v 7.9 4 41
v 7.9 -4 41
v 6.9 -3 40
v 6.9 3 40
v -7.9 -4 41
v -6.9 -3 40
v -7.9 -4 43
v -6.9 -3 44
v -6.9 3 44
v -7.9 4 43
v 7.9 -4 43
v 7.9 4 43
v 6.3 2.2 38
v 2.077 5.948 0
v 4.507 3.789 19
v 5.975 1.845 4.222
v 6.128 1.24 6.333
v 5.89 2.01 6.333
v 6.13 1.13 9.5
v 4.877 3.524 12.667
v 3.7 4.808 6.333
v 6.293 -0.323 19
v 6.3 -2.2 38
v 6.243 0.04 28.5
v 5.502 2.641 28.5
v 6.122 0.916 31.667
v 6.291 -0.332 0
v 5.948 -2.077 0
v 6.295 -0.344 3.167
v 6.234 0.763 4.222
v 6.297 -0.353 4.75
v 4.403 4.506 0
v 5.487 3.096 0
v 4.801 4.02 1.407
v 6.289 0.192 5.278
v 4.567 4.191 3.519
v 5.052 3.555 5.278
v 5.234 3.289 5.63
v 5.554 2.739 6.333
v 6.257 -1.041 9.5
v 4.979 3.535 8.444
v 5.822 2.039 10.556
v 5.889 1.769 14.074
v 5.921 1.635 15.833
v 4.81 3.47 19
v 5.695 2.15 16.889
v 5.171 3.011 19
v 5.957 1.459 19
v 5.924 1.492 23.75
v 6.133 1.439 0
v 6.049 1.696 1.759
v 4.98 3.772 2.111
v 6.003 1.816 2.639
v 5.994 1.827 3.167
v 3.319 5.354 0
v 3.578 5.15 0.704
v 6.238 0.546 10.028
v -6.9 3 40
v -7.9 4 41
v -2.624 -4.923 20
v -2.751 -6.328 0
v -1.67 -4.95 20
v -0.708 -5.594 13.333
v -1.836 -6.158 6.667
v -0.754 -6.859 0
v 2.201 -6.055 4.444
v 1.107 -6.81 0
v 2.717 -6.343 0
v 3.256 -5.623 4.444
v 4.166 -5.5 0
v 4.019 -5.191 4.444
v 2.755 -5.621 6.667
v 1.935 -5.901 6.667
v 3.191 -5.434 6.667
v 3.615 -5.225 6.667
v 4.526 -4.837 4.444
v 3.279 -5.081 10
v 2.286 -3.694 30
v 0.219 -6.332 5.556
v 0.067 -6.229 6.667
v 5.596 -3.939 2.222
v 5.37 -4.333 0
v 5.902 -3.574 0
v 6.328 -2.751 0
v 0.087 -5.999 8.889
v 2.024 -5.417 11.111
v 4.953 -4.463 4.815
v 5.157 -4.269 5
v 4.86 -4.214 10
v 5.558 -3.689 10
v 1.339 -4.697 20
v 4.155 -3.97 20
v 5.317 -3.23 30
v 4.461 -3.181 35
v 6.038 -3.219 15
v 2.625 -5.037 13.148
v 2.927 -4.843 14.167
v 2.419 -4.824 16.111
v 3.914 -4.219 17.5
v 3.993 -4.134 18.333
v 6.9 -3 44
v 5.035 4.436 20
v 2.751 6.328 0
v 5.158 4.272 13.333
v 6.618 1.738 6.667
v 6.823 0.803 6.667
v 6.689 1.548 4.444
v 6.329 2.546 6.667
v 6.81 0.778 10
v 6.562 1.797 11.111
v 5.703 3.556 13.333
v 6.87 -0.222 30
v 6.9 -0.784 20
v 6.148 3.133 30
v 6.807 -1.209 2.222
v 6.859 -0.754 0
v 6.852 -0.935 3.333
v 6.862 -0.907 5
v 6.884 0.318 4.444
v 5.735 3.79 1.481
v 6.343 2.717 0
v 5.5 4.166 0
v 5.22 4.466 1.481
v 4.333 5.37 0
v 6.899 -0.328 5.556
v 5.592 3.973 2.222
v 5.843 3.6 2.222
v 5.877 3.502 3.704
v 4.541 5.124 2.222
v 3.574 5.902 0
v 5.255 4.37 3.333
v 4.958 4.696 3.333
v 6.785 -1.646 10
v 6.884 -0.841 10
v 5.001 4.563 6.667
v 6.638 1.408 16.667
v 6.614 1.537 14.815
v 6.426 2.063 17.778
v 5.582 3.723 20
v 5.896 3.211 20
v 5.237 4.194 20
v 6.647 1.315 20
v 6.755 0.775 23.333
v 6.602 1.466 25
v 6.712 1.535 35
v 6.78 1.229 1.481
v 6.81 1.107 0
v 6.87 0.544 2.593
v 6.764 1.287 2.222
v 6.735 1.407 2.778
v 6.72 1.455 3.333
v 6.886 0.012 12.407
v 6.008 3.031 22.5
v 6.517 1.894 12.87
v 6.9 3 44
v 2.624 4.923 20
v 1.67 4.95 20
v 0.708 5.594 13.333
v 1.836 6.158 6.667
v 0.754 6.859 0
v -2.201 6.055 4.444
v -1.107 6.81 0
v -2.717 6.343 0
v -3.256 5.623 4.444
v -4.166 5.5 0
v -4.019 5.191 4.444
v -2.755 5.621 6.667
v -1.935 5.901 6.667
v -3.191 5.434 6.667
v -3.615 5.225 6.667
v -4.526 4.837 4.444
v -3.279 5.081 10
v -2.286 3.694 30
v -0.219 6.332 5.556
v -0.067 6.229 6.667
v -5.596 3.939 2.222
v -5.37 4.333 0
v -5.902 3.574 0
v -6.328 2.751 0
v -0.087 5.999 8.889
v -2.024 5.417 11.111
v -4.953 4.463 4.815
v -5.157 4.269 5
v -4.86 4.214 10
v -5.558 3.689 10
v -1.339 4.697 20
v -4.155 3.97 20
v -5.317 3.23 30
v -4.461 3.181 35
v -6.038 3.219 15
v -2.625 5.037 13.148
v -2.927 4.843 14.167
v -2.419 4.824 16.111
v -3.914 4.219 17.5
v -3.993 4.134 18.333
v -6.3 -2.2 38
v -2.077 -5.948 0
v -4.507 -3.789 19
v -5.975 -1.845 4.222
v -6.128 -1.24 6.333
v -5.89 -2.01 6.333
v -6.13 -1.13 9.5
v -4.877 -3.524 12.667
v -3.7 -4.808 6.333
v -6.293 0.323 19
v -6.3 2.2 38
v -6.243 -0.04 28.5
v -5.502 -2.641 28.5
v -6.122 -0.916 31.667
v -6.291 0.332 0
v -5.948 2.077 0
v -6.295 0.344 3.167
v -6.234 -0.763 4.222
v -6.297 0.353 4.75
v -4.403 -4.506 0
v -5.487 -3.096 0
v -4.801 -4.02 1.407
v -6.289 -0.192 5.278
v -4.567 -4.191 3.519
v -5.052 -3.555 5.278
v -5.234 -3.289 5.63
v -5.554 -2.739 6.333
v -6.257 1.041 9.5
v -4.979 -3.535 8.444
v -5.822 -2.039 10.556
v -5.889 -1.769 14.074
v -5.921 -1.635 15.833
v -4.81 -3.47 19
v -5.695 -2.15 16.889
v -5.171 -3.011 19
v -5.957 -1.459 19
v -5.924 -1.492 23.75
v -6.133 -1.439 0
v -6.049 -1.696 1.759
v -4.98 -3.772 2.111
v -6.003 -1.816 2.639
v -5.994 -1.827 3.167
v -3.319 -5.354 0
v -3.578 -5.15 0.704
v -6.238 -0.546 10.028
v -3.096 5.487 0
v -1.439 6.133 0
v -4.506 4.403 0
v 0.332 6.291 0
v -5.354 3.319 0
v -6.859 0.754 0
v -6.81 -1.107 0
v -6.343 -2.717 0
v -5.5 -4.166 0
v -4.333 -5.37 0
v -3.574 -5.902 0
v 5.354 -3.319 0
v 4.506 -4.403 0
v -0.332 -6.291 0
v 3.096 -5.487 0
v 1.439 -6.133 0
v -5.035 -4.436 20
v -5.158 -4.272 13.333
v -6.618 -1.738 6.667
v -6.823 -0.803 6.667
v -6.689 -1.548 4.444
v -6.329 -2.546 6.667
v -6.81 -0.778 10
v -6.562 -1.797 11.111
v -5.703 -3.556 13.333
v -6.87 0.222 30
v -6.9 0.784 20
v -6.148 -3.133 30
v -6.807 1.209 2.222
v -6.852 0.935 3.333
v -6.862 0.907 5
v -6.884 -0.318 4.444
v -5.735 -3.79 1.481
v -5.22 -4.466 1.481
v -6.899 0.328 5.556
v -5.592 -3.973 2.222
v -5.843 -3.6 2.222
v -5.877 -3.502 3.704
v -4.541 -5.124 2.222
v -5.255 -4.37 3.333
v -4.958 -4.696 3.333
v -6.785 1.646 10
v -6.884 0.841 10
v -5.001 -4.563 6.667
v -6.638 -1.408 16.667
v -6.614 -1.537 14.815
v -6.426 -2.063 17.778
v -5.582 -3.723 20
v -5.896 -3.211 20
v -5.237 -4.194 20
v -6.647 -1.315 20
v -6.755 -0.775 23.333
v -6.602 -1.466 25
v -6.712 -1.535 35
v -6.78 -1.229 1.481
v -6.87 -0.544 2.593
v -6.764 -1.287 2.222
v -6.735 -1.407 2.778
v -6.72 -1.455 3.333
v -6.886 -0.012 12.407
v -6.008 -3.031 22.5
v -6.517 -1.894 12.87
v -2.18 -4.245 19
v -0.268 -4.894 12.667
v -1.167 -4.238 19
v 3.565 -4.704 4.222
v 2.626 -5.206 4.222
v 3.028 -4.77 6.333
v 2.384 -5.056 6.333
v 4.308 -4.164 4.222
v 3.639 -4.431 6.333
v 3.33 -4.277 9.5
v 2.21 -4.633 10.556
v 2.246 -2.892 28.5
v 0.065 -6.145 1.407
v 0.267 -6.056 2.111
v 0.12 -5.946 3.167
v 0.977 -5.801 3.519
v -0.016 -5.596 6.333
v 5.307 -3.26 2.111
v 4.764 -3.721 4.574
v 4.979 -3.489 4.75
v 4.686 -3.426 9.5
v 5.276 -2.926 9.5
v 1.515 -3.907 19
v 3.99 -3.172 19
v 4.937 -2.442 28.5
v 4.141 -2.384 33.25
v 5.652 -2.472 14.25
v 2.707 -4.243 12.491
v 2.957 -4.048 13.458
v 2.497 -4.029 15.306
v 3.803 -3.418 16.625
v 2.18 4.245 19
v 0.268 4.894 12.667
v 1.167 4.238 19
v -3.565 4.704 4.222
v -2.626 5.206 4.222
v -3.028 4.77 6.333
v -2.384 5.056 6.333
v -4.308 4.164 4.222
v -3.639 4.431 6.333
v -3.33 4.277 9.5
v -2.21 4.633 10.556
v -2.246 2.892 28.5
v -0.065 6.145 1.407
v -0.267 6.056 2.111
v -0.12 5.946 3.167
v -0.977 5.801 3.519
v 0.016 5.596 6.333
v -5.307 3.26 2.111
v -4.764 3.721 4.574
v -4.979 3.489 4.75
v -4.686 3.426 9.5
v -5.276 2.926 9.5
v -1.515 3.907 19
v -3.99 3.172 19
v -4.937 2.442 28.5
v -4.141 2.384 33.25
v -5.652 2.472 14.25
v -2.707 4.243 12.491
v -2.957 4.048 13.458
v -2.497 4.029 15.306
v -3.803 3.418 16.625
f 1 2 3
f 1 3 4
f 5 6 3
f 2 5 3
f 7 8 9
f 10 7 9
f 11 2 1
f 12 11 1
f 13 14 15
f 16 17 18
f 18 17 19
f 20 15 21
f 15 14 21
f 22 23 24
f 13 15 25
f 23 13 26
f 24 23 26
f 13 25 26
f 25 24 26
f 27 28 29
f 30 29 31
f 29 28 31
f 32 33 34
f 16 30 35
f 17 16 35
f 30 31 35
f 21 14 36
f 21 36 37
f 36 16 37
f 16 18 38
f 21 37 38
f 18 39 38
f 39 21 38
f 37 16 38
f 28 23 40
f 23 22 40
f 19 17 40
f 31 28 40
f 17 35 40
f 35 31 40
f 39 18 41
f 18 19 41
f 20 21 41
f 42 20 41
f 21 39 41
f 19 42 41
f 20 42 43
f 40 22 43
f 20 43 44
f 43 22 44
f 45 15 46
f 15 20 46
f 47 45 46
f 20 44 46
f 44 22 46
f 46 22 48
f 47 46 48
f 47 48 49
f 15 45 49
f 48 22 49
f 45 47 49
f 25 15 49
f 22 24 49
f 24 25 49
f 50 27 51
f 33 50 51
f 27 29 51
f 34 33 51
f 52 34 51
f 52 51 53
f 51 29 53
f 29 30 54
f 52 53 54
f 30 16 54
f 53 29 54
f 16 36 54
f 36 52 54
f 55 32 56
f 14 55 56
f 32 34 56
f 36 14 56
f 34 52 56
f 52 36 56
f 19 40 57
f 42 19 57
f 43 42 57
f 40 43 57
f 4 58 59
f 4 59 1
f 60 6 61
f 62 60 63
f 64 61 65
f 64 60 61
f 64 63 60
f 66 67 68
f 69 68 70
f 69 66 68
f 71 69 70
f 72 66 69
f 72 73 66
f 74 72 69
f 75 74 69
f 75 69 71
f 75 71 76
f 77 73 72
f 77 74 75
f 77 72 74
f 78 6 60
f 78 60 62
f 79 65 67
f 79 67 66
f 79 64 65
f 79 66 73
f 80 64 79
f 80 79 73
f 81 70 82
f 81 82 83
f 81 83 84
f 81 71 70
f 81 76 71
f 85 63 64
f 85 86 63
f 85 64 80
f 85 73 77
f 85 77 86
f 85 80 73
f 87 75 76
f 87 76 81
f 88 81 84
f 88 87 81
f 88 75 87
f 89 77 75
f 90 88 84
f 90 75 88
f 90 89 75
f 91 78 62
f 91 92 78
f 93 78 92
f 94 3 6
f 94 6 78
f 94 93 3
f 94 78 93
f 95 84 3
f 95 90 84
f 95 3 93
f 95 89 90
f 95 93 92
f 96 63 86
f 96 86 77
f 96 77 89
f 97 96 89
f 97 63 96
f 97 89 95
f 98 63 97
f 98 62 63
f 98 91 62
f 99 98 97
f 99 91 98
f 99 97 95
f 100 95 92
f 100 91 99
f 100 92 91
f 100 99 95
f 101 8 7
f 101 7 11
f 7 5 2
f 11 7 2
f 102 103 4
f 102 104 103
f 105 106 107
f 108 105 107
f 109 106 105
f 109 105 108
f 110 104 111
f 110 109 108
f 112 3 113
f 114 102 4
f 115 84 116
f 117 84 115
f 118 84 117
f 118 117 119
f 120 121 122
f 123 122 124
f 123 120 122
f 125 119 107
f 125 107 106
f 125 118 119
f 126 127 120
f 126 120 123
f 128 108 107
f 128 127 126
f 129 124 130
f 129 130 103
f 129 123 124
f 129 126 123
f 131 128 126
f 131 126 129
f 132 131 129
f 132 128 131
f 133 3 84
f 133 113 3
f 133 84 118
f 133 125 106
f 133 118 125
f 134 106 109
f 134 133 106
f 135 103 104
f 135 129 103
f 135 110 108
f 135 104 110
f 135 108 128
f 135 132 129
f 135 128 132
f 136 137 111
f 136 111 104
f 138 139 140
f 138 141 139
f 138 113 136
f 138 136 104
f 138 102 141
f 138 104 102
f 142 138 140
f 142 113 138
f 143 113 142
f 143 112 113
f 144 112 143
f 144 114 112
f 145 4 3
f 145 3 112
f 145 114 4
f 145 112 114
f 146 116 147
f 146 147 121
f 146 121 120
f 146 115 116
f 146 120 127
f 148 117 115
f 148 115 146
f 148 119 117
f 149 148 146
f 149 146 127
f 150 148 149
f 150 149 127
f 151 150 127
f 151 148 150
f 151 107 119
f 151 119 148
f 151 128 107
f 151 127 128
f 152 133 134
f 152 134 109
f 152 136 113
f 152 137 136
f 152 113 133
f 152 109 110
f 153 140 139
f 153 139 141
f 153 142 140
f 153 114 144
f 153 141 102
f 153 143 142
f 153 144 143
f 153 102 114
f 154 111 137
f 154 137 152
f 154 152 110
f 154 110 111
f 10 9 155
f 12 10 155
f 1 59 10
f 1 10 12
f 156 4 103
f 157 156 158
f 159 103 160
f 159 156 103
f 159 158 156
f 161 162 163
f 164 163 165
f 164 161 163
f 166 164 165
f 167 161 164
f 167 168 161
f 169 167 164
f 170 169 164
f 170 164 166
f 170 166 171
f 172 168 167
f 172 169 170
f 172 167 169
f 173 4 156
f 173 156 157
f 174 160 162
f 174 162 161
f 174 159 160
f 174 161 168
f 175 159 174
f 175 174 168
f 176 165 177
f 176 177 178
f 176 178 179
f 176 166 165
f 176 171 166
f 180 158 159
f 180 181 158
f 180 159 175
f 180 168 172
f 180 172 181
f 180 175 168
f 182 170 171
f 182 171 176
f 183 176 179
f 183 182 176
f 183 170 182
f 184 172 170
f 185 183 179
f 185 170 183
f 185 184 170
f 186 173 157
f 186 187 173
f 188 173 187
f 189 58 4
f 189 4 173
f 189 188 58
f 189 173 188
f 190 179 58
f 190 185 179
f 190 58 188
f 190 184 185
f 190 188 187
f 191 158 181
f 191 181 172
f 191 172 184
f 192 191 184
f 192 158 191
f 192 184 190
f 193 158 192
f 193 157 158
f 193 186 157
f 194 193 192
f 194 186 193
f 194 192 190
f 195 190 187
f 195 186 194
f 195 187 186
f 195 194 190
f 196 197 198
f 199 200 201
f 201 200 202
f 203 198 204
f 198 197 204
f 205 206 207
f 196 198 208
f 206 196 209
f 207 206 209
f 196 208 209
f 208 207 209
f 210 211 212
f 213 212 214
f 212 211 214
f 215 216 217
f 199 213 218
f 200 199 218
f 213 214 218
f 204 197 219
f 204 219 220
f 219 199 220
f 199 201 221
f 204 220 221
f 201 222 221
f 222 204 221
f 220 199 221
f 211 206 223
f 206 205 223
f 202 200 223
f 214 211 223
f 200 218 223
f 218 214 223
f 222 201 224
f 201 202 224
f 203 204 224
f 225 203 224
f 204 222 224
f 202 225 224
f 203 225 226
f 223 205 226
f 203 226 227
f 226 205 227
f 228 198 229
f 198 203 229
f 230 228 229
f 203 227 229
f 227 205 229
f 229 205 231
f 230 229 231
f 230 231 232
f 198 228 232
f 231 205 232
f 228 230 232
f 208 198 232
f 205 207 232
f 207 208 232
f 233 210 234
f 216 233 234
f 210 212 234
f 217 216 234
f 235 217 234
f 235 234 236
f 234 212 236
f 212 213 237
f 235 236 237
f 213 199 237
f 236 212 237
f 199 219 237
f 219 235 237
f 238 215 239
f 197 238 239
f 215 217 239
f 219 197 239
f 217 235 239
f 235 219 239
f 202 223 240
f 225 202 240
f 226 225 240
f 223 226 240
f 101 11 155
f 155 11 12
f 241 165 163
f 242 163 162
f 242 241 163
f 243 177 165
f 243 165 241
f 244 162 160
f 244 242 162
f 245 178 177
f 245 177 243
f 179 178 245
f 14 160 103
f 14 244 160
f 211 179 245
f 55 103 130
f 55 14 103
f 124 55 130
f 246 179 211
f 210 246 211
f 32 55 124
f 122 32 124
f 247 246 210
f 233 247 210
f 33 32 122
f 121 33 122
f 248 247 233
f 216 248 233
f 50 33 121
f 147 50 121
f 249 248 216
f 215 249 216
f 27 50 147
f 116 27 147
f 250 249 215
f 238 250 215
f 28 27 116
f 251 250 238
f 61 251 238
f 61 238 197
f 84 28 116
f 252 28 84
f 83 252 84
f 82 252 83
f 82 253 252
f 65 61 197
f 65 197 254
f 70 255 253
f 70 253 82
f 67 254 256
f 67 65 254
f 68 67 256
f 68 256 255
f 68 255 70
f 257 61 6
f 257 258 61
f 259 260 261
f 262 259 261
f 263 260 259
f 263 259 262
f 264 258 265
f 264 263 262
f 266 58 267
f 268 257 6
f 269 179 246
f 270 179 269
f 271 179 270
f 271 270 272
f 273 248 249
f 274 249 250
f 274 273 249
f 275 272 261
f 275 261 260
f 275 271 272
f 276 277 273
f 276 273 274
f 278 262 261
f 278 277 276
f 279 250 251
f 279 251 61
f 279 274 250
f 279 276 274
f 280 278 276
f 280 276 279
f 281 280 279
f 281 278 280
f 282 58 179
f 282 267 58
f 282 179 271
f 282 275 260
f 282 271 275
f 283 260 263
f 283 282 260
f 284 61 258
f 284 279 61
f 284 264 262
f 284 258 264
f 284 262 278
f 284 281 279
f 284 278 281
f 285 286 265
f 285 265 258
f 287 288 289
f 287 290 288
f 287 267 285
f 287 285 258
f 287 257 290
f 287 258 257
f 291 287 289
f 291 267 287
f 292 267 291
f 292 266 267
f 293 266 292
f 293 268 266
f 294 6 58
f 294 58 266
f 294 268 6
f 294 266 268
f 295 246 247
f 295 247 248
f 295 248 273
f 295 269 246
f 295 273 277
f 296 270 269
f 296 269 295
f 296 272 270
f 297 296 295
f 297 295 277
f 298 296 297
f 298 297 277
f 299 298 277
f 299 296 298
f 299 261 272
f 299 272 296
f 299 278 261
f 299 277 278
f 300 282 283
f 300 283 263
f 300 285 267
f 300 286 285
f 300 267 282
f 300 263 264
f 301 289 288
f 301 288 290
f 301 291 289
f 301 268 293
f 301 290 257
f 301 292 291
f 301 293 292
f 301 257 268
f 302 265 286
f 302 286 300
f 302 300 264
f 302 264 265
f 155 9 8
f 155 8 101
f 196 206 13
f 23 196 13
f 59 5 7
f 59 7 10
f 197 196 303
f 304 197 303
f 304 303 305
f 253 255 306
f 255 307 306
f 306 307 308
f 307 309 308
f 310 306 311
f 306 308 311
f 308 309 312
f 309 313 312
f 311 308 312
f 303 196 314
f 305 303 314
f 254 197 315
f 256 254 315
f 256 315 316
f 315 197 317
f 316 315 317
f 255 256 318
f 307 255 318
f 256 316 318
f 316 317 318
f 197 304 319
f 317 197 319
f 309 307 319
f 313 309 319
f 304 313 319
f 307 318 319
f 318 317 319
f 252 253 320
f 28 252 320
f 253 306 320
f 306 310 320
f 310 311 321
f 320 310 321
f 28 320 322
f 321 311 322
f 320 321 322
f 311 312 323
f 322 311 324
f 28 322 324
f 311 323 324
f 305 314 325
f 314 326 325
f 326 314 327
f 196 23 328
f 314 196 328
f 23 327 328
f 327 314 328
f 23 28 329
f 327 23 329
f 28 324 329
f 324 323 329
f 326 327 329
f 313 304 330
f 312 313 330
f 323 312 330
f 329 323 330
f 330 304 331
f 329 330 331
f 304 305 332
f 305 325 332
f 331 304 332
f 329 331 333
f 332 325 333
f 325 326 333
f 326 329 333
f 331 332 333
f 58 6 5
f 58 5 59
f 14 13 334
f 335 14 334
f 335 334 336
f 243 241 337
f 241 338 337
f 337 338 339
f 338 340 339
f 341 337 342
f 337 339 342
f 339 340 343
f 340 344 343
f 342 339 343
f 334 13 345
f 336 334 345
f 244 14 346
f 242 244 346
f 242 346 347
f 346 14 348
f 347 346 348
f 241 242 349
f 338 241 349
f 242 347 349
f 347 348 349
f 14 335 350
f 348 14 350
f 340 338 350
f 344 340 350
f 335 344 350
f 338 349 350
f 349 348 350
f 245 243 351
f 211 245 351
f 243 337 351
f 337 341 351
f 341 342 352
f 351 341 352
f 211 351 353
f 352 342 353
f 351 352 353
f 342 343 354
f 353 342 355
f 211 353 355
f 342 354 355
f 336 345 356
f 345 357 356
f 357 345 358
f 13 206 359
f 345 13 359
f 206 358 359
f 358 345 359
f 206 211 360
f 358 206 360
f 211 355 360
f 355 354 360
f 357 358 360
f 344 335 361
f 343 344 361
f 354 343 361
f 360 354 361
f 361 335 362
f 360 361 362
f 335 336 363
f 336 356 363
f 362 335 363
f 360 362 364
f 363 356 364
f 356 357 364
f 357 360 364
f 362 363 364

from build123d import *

# Parameters (mm, degrees)
F2_W     = 13.8
F2_H     = 6
F6_W     = 12.6
F6_H     = 4.4
F8_W     = 15.8
F8_H     = 8
F9_DEPTH = 4
F10_SIZE = 0.99999


# Not quite as in the source:
# - a fillet or chamfer is up to 0.001 mm smaller than in the source, because OpenCascade refuses the exact size
# - the arcs of a loft's sections are written as splines that run evenly, so that the points pair up as in the source's solid


with BuildPart() as f3:
    # F0 (on Top) → F3 section 0
    with BuildSketch(Plane.XY):
        with BuildLine():
            add(Edge.make_bspline(
                [(-6.3277833881, 2.7512101688), (-6.6879159571, 1.9229052602), (-6.883211565, 1.0233196176), (-6.914692653, -0.782821821), (-6.7508657466, -1.6886669775), (-6.0887700743, -3.3693713762), (-5.5907618149, -4.143569333), (-4.3358874467, -5.4429646828), (-3.5795150773, -5.9676508192), (-2.7512101688, -6.3277833881)],
                knots=[0, 0, 0, 0, 0.25, 0.25, 0.5, 0.5, 0.75, 0.75, 1, 1, 1, 1], degree=3))
            add(Edge.make_bspline(
                [(-2.7512101688, -6.3277833881), (-1.9229052602, -6.6879159571), (-1.0233196176, -6.883211565), (0.782821821, -6.914692653), (1.6886669775, -6.7508657466), (3.3693713762, -6.0887700743), (4.143569333, -5.5907618149), (5.4429646828, -4.3358874467), (5.9676508192, -3.5795150773), (6.3277833881, -2.7512101688)],
                knots=[0, 0, 0, 0, 0.25, 0.25, 0.5, 0.5, 0.75, 0.75, 1, 1, 1, 1], degree=3))
            add(Edge.make_bspline(
                [(6.3277833881, -2.7512101688), (6.6879159571, -1.9229052602), (6.883211565, -1.0233196176), (6.914692653, 0.782821821), (6.7508657466, 1.6886669775), (6.0887700743, 3.3693713762), (5.5907618149, 4.143569333), (4.3358874467, 5.4429646828), (3.5795150773, 5.9676508192), (2.7512101688, 6.3277833881)],
                knots=[0, 0, 0, 0, 0.25, 0.25, 0.5, 0.5, 0.75, 0.75, 1, 1, 1, 1], degree=3))
            add(Edge.make_bspline(
                [(2.7512101688, 6.3277833881), (1.9229052602, 6.6879159571), (1.0233196176, 6.883211565), (-0.782821821, 6.914692653), (-1.6886669775, 6.7508657466), (-3.3693713762, 6.0887700743), (-4.143569333, 5.5907618149), (-5.4429646828, 4.3358874467), (-5.9676508192, 3.5795150773), (-6.3277833881, 2.7512101688)],
                knots=[0, 0, 0, 0, 0.25, 0.25, 0.5, 0.5, 0.75, 0.75, 1, 1, 1, 1], degree=3))
        make_face()
    # F2 (on offset) → F3 section 1
    with BuildSketch(Plane.XY.offset(40)):
        Rectangle(F2_W, F2_H)
    loft(ruled=True)

    # F5 (on Top) → F7 section 0
    with BuildSketch(Plane.XY):
        with BuildLine():
            add(Edge.make_bspline(
                [(-5.947778016, 2.0770018469), (-6.219656922, 1.2984395252), (-6.3366241137, 0.4661247359), (-6.2431050237, -1.1805579575), (-6.0326555377, -1.9942779624), (-5.3160969794, -3.479826193), (-4.8102698423, -4.151069919), (-3.5797613606, -5.2493224353), (-2.8555641686, -5.6758991101), (-2.0770018469, -5.947778016)],
                knots=[0, 0, 0, 0, 0.25, 0.25, 0.5, 0.5, 0.75, 0.75, 1, 1, 1, 1], degree=3))
            add(Edge.make_bspline(
                [(-2.0770018469, -5.947778016), (-1.2984395252, -6.219656922), (-0.4661247359, -6.3366241137), (1.1805579575, -6.2431050237), (1.9942779624, -6.0326555377), (3.479826193, -5.3160969794), (4.151069919, -4.8102698423), (5.2493224353, -3.5797613606), (5.6758991101, -2.8555641686), (5.947778016, -2.0770018469)],
                knots=[0, 0, 0, 0, 0.25, 0.25, 0.5, 0.5, 0.75, 0.75, 1, 1, 1, 1], degree=3))
            add(Edge.make_bspline(
                [(5.947778016, -2.0770018469), (6.219656922, -1.2984395252), (6.3366241137, -0.4661247359), (6.2431050237, 1.1805579575), (6.0326555377, 1.9942779624), (5.3160969794, 3.479826193), (4.8102698423, 4.151069919), (3.5797613606, 5.2493224353), (2.8555641686, 5.6758991101), (2.0770018469, 5.947778016)],
                knots=[0, 0, 0, 0, 0.25, 0.25, 0.5, 0.5, 0.75, 0.75, 1, 1, 1, 1], degree=3))
            add(Edge.make_bspline(
                [(2.0770018469, 5.947778016), (1.2984395252, 6.219656922), (0.4661247359, 6.3366241137), (-1.1805579575, 6.2431050237), (-1.9942779624, 6.0326555377), (-3.479826193, 5.3160969794), (-4.151069919, 4.8102698423), (-5.2493224353, 3.5797613606), (-5.6758991101, 2.8555641686), (-5.947778016, 2.0770018469)],
                knots=[0, 0, 0, 0, 0.25, 0.25, 0.5, 0.5, 0.75, 0.75, 1, 1, 1, 1], degree=3))
        make_face()
    # F6 (on offset) → F7 section 1
    with BuildSketch(Plane.XY.offset(38)):
        Rectangle(F6_W, F6_H)
    loft(ruled=True, mode=Mode.SUBTRACT)

    # F8 (on offset) → F9 (join)
    with BuildSketch(Plane.XY.offset(40)):
        Rectangle(F8_W, F8_H)
    extrude(amount=F9_DEPTH)

    # F10 (size 1 in the source; OpenCascade refuses exactly that, so slightly less here)
    f10_edges = [f3.edges().sort_by_distance(p)[0] for p in [
        (7.9, 0, 44),
        (0, -4, 44),
        (0, 4, 44),
        (-7.9, 0, 44),
        (0, -4, 40),
        (-7.9, 0, 40),
        (0, 4, 40),
        (7.9, 0, 40),
    ]]
    chamfer(f10_edges, length=F10_SIZE)


solid = f3.part
